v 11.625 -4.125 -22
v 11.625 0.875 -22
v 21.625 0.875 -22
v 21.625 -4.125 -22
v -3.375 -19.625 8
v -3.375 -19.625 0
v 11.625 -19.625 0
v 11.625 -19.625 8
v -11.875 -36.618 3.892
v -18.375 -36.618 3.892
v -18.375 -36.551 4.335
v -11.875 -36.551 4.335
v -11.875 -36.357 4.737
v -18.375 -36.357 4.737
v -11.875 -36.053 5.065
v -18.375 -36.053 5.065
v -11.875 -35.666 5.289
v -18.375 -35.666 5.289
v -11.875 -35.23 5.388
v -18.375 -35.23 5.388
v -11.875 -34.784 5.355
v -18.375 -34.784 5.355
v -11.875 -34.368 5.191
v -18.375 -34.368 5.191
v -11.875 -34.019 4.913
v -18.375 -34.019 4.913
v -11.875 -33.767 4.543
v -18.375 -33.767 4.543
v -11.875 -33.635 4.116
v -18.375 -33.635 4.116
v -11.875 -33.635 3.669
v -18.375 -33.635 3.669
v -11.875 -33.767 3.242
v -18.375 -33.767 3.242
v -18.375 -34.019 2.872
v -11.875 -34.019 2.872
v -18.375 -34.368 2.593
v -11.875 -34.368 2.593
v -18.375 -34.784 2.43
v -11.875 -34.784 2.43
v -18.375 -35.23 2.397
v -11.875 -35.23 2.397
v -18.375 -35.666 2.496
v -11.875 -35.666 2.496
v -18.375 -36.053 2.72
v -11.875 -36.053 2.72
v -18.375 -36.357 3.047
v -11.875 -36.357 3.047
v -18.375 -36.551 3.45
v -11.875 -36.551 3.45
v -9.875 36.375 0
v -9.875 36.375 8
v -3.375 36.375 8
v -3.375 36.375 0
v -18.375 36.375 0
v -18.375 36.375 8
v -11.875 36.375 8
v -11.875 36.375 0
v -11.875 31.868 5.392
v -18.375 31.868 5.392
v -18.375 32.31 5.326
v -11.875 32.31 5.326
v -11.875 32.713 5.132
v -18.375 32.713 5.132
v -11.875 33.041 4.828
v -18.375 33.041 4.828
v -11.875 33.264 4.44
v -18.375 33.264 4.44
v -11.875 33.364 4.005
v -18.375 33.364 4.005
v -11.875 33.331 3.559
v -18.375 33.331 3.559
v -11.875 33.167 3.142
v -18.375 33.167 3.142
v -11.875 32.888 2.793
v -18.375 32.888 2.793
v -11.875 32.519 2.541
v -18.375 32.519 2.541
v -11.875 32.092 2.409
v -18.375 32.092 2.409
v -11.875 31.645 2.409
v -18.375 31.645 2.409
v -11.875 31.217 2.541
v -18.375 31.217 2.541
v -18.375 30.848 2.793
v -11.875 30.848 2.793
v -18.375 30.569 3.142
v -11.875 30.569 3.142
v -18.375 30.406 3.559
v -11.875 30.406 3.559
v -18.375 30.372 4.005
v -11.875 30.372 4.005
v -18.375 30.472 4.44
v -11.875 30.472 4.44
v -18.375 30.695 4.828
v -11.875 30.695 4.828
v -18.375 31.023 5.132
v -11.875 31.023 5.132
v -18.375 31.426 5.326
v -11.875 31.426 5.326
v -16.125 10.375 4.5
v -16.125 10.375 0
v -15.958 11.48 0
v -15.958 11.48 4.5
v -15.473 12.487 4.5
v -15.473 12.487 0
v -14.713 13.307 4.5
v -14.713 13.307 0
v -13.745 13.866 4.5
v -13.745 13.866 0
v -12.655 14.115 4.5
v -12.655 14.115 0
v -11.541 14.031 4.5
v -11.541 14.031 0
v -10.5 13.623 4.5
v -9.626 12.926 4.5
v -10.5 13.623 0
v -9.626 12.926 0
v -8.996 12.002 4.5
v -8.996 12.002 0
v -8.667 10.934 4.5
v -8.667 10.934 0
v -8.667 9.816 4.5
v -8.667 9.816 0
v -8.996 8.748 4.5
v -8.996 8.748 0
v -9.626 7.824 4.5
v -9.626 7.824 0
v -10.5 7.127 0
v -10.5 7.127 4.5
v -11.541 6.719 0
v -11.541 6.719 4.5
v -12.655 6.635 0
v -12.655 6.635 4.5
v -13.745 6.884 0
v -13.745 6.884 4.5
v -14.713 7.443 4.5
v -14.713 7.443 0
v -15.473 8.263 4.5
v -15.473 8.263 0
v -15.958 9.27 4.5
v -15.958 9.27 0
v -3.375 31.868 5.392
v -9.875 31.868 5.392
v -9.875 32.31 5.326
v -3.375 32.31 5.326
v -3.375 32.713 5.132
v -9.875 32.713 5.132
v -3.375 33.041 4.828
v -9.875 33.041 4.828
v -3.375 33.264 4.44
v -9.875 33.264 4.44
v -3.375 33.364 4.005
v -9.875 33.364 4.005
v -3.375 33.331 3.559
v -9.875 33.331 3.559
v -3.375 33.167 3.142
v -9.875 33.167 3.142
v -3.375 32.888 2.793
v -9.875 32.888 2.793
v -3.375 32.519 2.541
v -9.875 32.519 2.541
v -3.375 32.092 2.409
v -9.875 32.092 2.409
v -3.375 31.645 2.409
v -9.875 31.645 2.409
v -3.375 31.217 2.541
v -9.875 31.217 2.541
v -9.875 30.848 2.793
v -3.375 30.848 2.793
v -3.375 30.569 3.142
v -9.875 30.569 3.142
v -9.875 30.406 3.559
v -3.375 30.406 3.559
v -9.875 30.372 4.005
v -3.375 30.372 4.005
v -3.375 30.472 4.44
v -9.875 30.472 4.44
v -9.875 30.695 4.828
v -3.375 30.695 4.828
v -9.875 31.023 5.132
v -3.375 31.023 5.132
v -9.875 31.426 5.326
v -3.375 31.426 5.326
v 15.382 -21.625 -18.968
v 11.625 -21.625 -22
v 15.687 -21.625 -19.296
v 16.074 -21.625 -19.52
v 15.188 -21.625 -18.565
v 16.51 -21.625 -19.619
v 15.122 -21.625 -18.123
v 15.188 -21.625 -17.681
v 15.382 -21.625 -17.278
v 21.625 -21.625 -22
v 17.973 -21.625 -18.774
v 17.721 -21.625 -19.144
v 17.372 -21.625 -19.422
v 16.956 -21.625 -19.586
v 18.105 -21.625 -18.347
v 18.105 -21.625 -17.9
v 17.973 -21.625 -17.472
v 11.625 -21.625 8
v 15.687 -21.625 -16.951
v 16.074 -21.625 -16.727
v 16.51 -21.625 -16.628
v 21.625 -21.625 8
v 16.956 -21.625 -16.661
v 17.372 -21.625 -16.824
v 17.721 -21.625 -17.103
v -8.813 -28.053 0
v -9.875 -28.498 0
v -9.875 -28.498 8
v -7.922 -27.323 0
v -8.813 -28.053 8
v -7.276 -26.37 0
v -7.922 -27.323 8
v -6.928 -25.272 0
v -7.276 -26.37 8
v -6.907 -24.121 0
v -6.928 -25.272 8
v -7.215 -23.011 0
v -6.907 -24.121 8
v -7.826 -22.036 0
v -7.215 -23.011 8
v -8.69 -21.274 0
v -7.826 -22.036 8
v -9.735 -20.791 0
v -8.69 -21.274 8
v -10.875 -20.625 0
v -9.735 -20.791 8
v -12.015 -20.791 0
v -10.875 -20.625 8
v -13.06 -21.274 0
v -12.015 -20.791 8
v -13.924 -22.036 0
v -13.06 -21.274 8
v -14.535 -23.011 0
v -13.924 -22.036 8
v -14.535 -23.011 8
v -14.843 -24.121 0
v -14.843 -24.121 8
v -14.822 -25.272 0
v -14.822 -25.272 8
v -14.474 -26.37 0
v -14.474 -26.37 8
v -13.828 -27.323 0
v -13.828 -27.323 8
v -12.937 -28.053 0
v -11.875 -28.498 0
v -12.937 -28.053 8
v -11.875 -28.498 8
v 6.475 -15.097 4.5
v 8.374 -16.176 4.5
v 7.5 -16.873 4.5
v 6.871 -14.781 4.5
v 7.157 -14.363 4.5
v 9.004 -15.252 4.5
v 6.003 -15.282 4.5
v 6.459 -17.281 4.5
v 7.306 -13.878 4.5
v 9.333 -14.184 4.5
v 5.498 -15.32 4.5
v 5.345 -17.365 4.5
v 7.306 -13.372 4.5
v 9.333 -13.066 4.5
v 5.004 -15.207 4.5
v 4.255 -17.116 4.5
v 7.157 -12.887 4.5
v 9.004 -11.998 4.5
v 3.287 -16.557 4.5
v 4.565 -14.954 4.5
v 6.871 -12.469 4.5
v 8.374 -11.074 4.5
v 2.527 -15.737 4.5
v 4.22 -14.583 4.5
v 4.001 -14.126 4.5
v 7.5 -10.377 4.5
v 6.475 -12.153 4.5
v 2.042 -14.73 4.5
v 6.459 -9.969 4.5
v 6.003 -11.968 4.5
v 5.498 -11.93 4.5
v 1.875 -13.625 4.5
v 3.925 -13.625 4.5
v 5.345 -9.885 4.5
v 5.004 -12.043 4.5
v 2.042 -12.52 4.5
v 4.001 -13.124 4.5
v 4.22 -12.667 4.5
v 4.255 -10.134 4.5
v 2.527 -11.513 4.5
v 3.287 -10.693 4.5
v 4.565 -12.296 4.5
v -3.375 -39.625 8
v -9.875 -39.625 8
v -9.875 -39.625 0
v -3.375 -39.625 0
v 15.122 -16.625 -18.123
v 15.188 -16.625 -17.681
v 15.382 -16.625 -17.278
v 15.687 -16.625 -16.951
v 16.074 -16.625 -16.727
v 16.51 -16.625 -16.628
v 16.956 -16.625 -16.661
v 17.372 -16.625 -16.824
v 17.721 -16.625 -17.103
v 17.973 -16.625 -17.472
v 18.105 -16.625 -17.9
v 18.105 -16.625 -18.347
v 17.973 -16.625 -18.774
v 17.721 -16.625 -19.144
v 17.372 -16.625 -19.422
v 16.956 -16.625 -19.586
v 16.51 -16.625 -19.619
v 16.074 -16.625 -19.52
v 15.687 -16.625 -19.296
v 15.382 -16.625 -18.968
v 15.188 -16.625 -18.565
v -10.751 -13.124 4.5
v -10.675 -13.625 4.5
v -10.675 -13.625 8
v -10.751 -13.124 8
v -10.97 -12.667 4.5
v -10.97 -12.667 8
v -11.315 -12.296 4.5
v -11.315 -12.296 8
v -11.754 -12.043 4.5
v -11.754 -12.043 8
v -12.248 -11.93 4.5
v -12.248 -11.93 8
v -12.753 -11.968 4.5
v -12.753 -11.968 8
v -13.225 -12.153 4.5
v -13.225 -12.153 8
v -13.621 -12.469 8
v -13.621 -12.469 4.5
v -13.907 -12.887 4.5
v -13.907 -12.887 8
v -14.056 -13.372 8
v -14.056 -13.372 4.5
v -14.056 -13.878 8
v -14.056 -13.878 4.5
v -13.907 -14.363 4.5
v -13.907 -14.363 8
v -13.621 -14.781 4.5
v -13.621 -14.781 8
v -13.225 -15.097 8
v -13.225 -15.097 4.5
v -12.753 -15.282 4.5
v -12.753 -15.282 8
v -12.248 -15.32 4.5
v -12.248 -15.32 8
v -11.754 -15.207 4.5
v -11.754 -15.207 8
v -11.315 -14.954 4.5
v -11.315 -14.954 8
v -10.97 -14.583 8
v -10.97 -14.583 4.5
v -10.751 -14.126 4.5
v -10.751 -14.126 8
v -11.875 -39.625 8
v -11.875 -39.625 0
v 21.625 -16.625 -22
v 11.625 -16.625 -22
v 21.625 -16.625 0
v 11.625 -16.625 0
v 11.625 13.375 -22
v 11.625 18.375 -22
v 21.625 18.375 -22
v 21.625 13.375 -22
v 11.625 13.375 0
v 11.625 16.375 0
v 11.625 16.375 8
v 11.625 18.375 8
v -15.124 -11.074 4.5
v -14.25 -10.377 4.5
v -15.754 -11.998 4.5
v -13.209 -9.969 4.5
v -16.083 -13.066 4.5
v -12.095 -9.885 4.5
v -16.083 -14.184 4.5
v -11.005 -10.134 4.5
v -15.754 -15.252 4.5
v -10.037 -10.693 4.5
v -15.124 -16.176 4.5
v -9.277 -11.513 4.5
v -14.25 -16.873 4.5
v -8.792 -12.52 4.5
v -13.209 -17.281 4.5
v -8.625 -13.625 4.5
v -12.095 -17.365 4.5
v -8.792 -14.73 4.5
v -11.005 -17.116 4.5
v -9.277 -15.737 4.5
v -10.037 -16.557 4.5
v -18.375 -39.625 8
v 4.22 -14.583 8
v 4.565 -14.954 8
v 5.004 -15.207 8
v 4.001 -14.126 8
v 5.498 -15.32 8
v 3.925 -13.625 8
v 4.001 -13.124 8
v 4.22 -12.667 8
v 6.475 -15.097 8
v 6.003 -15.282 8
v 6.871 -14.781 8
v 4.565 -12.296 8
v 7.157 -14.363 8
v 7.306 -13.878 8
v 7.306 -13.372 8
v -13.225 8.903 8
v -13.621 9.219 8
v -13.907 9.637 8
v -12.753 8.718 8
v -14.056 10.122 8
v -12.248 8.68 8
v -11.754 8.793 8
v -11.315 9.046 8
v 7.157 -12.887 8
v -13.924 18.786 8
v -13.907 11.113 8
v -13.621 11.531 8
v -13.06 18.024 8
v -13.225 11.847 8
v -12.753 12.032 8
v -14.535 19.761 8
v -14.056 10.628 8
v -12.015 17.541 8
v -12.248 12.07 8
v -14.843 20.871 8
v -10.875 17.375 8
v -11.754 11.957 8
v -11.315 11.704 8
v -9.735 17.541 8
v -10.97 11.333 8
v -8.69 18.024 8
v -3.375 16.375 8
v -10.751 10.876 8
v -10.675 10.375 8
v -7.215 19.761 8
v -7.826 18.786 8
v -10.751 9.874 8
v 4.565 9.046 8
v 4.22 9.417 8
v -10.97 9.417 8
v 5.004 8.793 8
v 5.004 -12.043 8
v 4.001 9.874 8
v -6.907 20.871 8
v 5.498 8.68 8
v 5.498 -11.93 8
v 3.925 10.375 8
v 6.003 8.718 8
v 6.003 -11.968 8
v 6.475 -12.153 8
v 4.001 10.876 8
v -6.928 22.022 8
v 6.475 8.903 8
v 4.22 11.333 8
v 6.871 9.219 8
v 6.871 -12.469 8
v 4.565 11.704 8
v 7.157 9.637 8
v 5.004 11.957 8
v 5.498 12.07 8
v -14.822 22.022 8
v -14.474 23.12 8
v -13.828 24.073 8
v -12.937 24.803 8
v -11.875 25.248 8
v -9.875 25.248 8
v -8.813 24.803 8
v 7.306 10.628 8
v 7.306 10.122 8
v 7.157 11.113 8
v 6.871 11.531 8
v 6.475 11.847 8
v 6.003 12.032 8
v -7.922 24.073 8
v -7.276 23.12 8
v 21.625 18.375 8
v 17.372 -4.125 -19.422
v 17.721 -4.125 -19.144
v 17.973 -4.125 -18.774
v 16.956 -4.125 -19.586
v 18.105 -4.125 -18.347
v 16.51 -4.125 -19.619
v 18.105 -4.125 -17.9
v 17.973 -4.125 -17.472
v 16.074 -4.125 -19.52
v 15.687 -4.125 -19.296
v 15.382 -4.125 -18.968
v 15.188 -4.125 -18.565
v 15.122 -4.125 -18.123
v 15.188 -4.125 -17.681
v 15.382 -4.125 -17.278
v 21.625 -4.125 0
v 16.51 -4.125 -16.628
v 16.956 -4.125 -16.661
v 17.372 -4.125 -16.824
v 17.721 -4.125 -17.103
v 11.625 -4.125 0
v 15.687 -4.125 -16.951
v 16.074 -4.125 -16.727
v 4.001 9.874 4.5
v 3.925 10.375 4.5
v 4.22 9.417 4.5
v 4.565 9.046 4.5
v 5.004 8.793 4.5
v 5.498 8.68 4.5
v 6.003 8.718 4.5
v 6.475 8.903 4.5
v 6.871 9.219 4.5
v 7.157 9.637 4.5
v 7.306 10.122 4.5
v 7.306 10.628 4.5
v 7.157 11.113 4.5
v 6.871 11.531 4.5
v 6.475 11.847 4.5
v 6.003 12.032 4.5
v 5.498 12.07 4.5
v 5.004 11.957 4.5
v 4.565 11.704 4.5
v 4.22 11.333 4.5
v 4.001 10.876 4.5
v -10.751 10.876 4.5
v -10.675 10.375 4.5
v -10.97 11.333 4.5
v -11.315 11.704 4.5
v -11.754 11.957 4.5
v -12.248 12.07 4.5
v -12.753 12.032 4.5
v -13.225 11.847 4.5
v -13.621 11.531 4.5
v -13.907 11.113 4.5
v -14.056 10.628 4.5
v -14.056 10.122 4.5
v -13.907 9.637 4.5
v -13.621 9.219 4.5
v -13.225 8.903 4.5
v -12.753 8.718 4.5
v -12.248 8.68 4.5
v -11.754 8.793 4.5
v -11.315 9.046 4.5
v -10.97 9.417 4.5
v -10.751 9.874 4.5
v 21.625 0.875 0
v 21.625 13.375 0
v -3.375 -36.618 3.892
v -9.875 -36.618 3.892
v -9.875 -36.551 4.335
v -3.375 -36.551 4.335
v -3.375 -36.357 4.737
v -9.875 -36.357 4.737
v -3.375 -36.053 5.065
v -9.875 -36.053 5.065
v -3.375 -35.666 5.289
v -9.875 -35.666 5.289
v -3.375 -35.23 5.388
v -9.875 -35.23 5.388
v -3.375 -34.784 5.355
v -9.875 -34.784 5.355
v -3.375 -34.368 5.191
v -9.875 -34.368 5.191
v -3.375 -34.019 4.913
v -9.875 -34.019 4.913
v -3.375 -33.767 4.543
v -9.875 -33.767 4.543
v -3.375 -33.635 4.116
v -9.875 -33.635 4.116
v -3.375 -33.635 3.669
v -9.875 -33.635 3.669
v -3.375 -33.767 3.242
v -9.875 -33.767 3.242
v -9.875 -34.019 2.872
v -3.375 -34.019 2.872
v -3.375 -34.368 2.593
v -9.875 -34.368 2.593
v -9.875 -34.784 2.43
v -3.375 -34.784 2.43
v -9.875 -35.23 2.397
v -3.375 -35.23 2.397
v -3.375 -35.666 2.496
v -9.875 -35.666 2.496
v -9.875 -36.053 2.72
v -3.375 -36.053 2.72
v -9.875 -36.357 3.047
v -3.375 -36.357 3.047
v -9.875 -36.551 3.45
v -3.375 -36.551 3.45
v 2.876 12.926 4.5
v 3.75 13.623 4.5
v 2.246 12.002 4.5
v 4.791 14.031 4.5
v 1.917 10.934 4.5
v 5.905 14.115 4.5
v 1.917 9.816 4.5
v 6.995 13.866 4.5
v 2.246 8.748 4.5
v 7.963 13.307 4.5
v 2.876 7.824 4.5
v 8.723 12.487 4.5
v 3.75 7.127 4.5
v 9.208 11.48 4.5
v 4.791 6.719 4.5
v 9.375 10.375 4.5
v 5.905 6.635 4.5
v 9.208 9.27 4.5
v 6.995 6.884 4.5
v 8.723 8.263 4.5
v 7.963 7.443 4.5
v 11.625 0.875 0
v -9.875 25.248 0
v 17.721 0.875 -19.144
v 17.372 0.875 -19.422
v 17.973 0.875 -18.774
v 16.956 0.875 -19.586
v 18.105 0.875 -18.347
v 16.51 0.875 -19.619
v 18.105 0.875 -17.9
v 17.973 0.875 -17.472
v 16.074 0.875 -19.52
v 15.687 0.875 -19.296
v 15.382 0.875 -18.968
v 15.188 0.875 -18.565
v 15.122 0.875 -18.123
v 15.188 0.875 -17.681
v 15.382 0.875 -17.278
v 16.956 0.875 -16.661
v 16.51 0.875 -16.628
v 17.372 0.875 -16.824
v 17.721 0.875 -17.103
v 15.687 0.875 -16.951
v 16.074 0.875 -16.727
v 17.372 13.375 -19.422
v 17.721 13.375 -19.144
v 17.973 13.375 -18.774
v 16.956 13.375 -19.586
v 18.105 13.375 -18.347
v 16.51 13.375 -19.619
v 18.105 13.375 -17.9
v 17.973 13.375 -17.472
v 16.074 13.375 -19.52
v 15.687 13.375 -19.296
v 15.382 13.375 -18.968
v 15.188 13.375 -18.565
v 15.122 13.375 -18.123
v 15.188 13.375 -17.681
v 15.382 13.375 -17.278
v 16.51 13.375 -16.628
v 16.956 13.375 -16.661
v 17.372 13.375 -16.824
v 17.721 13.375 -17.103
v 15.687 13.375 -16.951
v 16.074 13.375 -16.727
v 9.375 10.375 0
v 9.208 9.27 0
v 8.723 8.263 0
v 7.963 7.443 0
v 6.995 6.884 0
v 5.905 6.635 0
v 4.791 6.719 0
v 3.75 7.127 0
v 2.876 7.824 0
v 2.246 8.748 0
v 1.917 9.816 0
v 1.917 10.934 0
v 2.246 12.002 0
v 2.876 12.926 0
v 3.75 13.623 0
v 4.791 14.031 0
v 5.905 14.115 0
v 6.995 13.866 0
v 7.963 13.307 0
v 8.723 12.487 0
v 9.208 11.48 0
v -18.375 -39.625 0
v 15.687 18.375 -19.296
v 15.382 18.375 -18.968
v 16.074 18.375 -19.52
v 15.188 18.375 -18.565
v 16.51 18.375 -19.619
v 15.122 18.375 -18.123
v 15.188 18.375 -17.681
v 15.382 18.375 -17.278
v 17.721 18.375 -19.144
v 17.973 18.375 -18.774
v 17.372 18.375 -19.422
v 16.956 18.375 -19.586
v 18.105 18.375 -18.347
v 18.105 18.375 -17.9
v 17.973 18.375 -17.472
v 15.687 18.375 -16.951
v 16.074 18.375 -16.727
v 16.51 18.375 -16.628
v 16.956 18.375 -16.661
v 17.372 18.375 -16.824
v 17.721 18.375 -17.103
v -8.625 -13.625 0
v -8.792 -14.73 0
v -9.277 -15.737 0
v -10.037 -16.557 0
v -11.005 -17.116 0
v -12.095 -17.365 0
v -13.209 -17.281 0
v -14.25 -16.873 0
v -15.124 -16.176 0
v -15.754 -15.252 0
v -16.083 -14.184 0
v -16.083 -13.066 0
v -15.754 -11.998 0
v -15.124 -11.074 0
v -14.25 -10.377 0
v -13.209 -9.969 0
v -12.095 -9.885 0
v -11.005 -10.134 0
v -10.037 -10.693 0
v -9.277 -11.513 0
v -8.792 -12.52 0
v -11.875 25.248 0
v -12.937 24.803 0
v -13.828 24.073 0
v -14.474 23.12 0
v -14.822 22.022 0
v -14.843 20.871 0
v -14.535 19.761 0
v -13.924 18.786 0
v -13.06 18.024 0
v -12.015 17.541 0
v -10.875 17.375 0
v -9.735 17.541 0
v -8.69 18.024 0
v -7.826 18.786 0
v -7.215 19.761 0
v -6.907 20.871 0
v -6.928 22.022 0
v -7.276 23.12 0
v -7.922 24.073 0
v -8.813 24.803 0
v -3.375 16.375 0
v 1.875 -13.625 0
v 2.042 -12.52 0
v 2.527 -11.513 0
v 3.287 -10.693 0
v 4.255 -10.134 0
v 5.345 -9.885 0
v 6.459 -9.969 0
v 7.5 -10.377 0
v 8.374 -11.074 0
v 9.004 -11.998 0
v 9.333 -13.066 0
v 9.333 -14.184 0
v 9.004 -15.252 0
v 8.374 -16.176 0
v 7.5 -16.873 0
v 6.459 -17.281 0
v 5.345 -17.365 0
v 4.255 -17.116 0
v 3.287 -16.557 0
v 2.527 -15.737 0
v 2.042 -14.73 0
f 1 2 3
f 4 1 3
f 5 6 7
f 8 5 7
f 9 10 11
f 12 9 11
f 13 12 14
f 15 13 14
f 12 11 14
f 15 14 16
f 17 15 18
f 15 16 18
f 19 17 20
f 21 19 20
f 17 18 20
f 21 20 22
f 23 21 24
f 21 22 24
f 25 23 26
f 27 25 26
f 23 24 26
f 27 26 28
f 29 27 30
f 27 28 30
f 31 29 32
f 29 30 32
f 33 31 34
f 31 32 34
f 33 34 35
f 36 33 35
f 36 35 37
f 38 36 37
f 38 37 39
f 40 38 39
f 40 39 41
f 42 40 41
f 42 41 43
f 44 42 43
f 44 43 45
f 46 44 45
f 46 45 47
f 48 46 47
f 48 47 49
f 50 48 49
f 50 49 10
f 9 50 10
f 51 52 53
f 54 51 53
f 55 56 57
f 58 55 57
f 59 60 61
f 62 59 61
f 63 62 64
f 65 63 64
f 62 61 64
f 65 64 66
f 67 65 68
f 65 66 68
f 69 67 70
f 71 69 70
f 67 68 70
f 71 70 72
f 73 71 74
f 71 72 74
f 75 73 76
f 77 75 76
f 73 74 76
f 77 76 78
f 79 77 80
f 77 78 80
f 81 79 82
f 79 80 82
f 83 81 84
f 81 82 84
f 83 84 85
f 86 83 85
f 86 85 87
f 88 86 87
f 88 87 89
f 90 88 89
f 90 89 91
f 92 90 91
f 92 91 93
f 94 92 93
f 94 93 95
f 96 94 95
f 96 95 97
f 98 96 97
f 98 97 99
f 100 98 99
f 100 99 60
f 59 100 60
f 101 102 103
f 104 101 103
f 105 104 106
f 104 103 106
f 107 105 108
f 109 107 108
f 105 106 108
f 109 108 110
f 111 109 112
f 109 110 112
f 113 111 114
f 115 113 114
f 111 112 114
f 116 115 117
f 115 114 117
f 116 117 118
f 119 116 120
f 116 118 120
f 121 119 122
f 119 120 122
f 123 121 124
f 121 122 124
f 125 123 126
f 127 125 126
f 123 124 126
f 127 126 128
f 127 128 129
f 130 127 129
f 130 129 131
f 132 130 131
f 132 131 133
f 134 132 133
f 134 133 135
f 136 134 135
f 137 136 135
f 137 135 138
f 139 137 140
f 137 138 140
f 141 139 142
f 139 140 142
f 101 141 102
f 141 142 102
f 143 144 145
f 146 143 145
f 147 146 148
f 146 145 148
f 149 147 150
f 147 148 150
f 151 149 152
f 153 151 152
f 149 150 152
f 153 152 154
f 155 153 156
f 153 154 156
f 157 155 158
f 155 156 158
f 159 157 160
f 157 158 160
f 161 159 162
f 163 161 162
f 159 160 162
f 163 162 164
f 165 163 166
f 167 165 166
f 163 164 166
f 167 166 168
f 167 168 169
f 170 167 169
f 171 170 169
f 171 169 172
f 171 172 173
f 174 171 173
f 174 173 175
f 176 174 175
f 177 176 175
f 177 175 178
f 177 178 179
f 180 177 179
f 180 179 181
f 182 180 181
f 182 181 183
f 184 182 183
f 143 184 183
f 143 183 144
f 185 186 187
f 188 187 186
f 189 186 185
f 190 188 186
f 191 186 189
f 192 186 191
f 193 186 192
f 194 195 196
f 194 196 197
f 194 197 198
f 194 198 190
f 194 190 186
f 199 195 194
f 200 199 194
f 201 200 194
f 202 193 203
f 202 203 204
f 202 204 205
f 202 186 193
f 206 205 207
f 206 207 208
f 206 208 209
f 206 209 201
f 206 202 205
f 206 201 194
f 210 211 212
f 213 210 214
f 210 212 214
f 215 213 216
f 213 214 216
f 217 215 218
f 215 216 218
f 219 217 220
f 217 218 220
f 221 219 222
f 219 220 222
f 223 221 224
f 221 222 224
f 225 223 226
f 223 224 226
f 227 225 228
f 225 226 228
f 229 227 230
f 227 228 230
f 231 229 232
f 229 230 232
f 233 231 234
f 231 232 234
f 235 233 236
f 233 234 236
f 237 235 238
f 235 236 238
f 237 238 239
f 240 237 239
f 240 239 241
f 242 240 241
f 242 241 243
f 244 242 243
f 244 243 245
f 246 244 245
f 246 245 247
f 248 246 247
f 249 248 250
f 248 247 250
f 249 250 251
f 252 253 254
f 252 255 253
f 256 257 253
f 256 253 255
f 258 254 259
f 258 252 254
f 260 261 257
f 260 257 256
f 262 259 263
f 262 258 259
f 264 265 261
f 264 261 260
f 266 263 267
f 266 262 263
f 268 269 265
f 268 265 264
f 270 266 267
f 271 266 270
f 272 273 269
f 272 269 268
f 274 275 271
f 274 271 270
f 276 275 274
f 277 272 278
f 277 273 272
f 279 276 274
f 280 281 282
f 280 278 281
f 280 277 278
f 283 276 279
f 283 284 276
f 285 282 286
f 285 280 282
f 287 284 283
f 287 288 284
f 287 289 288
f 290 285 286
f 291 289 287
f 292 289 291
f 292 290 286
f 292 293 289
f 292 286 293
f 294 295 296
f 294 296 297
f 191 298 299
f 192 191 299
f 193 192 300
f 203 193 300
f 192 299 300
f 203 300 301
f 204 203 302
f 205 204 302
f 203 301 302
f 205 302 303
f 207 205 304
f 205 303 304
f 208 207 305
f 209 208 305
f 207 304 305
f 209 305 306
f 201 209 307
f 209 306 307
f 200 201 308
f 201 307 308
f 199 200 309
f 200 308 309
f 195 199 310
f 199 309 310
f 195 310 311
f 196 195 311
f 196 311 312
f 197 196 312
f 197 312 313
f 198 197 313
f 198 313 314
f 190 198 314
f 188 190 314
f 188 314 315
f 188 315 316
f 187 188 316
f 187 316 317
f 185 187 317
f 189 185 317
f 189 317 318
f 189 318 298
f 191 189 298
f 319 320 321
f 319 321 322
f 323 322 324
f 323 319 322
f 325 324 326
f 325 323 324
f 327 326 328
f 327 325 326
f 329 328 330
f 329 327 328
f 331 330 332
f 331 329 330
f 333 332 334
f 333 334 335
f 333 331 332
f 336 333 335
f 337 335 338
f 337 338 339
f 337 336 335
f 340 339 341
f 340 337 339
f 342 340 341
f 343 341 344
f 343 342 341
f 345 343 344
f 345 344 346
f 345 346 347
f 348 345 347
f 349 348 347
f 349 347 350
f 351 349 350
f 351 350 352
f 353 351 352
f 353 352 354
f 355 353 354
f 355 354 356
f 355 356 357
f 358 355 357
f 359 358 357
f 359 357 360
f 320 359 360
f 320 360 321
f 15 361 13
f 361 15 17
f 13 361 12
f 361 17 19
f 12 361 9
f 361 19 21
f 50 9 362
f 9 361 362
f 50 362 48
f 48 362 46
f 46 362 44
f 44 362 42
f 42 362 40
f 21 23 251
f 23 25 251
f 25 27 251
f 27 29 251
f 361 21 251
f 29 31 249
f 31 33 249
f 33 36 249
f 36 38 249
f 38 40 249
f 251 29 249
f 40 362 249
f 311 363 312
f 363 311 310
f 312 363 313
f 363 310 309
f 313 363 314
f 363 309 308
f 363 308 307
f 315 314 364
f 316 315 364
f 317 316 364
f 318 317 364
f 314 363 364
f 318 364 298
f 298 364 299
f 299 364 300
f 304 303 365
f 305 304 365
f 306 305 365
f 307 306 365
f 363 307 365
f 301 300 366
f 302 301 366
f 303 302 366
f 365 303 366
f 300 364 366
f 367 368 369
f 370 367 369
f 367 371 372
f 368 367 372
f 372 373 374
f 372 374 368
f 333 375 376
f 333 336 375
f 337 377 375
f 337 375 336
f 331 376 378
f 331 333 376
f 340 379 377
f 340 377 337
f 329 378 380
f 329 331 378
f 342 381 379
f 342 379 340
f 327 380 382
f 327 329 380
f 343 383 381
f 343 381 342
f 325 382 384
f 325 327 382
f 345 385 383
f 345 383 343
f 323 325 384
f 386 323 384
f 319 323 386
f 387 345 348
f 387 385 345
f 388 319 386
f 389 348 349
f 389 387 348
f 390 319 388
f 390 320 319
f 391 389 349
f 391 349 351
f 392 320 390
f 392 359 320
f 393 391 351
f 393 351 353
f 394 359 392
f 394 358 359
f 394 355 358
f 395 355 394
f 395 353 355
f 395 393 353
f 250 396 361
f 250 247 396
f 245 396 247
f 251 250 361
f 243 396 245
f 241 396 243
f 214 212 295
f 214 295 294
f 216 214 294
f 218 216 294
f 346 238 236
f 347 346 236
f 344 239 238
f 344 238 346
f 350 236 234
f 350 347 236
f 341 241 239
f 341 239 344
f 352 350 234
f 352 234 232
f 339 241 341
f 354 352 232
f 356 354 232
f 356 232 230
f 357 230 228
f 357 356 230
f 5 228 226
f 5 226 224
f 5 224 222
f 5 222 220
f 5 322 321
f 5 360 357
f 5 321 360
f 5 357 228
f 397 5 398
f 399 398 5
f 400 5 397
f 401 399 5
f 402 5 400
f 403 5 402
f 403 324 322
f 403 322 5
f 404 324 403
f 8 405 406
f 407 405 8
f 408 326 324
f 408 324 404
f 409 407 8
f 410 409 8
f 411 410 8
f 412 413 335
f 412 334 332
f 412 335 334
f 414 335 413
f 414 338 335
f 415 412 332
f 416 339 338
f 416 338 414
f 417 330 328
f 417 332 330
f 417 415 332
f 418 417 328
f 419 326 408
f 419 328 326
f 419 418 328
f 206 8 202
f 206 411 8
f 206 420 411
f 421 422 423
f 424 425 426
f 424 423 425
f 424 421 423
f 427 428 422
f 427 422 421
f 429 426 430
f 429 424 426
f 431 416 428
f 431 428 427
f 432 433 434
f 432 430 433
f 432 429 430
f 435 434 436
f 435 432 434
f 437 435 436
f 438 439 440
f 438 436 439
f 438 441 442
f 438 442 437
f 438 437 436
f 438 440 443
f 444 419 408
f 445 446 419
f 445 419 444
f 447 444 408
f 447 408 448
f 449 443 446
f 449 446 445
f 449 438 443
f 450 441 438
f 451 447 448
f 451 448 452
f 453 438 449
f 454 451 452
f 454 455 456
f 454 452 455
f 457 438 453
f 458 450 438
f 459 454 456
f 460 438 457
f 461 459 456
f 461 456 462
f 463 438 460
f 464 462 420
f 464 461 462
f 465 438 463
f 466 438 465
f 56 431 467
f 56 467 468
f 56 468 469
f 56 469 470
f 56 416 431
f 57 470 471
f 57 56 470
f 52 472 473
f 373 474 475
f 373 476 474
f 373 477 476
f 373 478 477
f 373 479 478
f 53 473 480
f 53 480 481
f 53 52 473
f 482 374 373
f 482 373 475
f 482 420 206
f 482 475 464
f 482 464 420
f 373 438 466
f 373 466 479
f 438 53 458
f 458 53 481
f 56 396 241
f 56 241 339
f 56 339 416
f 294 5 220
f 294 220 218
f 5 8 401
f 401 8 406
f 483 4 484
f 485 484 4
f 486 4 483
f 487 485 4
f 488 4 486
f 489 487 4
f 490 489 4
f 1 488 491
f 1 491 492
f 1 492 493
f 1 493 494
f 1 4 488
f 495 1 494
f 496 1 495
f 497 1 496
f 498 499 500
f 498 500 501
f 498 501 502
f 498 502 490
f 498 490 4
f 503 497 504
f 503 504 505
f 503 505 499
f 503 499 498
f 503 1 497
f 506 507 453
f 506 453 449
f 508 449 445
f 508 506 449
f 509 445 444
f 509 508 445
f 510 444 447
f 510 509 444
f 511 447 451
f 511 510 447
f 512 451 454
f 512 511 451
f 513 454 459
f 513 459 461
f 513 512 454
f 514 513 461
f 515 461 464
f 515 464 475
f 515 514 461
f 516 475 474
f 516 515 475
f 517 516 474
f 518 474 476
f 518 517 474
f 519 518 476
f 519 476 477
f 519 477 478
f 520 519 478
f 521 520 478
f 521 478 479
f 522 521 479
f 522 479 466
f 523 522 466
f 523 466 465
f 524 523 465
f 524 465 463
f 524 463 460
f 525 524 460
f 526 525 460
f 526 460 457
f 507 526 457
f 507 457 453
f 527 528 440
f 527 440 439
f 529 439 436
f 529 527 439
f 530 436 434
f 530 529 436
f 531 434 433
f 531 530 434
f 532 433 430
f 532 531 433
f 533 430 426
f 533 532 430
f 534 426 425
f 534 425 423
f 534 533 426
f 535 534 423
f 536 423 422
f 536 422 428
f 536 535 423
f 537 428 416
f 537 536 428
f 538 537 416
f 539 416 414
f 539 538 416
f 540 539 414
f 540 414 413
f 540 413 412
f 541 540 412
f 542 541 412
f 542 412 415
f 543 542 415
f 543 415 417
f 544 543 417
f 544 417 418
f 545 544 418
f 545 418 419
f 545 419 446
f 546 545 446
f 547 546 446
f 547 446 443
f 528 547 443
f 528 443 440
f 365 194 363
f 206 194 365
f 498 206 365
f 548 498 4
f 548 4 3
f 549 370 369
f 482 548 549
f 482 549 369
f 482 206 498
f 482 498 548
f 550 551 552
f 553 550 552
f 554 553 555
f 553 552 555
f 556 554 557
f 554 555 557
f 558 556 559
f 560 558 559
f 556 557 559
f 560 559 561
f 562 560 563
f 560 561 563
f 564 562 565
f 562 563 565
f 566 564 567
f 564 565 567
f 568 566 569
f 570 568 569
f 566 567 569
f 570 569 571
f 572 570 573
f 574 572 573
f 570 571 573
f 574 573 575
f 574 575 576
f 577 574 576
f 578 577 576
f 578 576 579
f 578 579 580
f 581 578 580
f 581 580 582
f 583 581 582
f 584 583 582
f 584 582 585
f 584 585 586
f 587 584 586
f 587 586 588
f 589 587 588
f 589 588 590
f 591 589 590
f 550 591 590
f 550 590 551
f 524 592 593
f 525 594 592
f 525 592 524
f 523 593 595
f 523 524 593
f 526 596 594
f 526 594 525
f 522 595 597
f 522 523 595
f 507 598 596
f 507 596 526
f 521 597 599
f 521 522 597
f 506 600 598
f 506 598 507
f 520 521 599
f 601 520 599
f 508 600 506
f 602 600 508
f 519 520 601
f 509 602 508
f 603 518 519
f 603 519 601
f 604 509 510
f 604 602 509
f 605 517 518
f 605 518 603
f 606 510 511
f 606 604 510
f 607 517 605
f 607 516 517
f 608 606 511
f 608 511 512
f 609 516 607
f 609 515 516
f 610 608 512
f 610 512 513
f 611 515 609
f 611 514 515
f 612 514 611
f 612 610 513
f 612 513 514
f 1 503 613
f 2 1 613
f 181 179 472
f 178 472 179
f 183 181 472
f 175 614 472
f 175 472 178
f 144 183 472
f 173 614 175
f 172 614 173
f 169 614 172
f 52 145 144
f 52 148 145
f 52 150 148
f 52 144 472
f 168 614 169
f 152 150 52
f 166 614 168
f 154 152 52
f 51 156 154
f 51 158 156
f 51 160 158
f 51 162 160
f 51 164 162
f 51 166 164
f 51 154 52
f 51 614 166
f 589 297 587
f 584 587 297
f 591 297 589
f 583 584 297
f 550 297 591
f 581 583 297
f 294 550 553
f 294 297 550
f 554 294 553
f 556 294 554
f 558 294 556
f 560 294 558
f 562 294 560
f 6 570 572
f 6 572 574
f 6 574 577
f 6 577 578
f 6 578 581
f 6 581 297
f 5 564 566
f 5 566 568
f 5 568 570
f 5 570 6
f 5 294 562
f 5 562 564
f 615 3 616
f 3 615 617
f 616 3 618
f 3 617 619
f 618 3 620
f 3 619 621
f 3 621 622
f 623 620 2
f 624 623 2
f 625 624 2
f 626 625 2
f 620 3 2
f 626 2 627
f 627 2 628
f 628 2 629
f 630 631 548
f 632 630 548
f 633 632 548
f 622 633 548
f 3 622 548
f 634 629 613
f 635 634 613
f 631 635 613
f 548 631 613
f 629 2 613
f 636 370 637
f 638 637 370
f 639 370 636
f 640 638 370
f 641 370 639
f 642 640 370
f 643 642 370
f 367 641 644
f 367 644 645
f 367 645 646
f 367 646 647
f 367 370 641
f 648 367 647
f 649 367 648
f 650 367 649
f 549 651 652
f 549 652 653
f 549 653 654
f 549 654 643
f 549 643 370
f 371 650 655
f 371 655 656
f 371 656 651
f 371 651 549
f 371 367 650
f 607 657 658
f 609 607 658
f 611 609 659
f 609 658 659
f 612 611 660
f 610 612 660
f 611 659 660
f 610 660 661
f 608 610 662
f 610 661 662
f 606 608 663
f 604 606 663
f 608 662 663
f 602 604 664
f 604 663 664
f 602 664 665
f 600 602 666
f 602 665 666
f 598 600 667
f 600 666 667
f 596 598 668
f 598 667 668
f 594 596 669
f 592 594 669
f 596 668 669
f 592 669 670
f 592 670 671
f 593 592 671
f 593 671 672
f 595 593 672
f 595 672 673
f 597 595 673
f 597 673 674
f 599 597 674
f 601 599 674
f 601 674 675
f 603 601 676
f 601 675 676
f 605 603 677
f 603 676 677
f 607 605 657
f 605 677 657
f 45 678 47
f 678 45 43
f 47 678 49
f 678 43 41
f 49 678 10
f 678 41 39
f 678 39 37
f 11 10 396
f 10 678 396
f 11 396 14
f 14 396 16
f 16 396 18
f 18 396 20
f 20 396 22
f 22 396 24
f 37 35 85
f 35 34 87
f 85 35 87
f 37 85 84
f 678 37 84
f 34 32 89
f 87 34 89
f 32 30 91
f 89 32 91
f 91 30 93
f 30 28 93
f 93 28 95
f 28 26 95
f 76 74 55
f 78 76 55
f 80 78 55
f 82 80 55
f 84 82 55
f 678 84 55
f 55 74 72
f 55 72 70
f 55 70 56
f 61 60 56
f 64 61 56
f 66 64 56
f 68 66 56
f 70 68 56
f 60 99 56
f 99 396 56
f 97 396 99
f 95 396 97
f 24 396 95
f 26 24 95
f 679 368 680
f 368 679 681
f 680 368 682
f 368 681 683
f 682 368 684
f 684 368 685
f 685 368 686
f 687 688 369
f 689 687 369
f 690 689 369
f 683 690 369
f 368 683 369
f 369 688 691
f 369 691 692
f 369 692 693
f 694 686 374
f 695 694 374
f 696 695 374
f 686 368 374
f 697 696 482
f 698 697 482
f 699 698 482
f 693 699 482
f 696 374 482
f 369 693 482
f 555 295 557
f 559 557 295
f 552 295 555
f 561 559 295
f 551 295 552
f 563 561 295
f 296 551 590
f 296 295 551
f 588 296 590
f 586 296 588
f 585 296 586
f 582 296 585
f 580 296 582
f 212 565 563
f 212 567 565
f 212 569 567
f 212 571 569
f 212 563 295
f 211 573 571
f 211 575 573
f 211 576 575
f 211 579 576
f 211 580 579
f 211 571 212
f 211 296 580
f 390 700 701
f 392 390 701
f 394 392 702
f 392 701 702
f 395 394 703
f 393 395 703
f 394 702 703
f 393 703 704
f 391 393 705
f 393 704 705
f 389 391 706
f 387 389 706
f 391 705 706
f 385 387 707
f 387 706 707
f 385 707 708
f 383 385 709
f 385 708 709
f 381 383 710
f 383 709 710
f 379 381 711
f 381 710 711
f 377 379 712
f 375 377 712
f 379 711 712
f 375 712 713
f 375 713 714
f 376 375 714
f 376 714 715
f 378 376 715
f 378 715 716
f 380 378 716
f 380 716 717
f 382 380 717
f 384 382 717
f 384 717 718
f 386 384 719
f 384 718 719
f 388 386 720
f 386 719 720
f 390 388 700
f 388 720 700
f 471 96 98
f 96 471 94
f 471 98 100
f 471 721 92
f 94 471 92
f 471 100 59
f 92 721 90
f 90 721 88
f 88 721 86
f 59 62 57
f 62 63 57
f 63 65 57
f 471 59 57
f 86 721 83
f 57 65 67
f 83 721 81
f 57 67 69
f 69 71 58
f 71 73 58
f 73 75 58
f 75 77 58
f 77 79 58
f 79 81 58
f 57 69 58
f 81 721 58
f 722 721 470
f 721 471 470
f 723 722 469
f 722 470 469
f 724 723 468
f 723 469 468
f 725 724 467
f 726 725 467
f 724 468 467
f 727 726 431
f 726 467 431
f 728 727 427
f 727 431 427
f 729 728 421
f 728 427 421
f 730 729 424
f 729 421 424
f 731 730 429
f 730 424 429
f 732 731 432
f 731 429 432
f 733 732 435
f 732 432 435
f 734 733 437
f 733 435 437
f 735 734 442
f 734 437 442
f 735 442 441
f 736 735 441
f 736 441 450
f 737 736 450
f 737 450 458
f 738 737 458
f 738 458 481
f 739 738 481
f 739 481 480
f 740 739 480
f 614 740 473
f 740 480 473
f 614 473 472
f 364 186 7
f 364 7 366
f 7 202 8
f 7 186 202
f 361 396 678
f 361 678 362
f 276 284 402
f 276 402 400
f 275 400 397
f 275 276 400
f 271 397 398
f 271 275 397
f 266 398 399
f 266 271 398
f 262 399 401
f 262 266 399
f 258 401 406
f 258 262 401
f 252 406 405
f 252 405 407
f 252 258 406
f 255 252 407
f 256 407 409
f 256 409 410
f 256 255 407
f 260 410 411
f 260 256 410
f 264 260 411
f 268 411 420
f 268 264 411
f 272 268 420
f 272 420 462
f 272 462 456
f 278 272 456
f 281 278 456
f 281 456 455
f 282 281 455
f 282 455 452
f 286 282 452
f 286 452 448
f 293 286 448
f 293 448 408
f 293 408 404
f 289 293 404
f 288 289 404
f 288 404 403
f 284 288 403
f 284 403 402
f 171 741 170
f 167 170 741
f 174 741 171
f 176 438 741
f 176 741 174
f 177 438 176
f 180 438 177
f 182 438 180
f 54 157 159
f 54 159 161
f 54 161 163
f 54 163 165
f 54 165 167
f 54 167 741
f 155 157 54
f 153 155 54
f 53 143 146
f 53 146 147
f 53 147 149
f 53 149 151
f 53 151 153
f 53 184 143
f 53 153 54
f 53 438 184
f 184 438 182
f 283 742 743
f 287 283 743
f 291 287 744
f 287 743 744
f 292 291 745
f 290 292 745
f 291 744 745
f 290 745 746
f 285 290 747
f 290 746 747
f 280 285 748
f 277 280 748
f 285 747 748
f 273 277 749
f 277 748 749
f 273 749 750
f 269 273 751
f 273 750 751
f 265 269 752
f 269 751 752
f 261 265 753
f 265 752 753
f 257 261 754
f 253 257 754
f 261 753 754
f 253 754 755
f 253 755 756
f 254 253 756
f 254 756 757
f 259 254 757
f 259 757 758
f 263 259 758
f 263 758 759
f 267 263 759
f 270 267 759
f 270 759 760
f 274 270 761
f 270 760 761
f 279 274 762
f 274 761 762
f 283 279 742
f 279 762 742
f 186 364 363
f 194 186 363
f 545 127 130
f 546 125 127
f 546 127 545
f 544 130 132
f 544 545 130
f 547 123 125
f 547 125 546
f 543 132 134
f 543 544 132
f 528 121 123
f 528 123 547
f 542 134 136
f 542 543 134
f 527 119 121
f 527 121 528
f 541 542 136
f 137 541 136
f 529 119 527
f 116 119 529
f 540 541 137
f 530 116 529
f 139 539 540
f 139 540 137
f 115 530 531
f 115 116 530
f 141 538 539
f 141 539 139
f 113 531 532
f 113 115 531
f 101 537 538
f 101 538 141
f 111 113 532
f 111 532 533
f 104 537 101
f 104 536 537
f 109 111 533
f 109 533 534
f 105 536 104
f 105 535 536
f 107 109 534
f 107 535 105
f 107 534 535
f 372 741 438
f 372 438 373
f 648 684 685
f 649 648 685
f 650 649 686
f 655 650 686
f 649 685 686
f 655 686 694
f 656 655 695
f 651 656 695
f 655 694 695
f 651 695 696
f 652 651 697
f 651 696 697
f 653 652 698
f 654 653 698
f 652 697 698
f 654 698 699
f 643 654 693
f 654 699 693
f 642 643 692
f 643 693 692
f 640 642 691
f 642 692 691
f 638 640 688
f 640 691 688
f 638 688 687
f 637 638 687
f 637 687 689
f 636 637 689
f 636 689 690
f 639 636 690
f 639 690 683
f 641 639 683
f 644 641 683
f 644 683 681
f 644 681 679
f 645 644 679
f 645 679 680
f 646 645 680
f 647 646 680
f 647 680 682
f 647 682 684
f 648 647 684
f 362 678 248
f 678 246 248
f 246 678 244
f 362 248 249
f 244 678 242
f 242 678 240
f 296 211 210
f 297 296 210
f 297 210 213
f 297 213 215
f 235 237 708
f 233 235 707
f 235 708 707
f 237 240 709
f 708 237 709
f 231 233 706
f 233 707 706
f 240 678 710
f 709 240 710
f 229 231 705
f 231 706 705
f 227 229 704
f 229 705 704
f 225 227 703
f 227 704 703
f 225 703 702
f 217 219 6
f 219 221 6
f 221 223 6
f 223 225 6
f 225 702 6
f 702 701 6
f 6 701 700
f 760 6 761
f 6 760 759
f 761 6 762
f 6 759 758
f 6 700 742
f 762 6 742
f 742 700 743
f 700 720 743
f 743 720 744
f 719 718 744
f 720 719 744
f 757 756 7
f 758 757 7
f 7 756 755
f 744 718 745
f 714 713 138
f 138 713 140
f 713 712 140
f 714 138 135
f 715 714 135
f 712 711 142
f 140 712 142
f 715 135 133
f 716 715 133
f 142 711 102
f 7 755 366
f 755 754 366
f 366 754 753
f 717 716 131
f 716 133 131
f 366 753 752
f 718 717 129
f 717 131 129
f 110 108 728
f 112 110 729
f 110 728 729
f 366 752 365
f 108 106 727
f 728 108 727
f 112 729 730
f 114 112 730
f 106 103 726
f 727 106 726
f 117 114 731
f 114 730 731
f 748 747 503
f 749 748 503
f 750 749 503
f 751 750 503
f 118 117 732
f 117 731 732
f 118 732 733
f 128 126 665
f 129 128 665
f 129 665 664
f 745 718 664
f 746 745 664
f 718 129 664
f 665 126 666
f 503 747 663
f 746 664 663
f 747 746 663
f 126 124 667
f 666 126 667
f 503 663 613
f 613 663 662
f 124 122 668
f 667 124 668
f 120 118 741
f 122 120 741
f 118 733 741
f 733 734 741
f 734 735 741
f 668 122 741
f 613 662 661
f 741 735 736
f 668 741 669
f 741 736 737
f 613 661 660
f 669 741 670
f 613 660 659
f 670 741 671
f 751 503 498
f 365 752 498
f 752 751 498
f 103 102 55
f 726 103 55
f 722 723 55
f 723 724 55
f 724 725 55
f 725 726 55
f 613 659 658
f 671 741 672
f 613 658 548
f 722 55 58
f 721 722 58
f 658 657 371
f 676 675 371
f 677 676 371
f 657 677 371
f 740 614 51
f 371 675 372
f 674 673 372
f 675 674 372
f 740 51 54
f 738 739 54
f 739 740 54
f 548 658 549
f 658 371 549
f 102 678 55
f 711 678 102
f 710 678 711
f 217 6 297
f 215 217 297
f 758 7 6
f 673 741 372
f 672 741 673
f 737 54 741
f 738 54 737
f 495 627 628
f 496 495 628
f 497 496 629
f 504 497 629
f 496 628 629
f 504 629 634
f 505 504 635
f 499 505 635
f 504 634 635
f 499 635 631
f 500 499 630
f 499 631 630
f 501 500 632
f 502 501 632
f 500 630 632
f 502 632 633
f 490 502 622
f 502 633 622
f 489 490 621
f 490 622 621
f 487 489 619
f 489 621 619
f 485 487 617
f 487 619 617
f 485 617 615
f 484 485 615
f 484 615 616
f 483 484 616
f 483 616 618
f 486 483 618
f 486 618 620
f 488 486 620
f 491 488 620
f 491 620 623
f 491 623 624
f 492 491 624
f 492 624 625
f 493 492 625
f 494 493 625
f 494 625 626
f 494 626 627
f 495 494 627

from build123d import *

# Parameters (mm, degrees)
SKETCH_1_W          = 30
SKETCH_1_H          = 36
SKETCH_1_R          = 1.7
EXTRUDE_1_DEPTH     = 8
SKETCH_2_R          = 3.75
CUT_EXTRUDE_1_DEPTH = 4.5
SKETCH_3_W          = 15
SKETCH_3_H          = 20
SKETCH_3_R          = 4
EXTRUDE_4_DEPTH     = 8
SKETCH_8_W          = 10
SKETCH_8_H          = 40
EXTRUDE_5_DEPTH     = 30
SKETCH_10_W         = 12
SKETCH_10_H         = 12.5
SKETCH_10_W_2       = 5
CUT_EXTRUDE_4_DEPTH = 30
SKETCH_11_R         = 1.5
CUT_EXTRUDE_5_DEPTH = 47
SKETCH_12_W         = 2
SKETCH_12_H         = 25.842259392
SKETCH_12_H_2       = 30.756424204
CUT_EXTRUDE_6_DEPTH = 10
SKETCH_13_R         = 1.5
CUT_EXTRUDE_7_DEPTH = 40
SKETCH_14_W         = 5
SKETCH_14_H         = 12.5
CUT_EXTRUDE_8_DEPTH = 10


with BuildPart() as part:
    # 草图1 → 凸台-拉伸1 (new body)
    with BuildSketch(Plane.XY):
        with Locations((-3.375, -1.625)):
            Rectangle(SKETCH_1_W, SKETCH_1_H)
        with Locations((-12.375, 10.375)):
            Circle(SKETCH_1_R, mode=Mode.SUBTRACT)
        with Locations((-12.375, -13.625)):
            Circle(SKETCH_1_R, mode=Mode.SUBTRACT)
        with Locations(Location((5.625, -13.625, 0), (0, 0, 180))):
            Circle(SKETCH_1_R, mode=Mode.SUBTRACT)
        with Locations(Location((5.625, 10.375, 0), (0, 0, 180))):
            Circle(SKETCH_1_R, mode=Mode.SUBTRACT)
    extrude(amount=EXTRUDE_1_DEPTH)

    # 草图2 → 切除-拉伸1 (cut)
    with BuildSketch(Plane(origin=(0, 0, 0), x_dir=(-1, 0, 0), z_dir=(0, 0, -1))):
        with Locations((12.375, 10.375)):
            Circle(SKETCH_2_R)
        with Locations(Location((-5.625, 10.375, 0), (0, 0, 180))):
            Circle(SKETCH_2_R)
        with Locations(Location((12.375, -13.625, 0), (0, 0, 180))):
            Circle(SKETCH_2_R)
        with Locations((-5.625, -13.625)):
            Circle(SKETCH_2_R)
    extrude(amount=-CUT_EXTRUDE_1_DEPTH, mode=Mode.SUBTRACT)

    # 草图3 → 凸台-拉伸4 (add)
    # profile 1 of 2: a face of its own
    with BuildSketch(Plane.XY.offset(8)):
        with Locations((-10.875, 26.375)):
            Rectangle(SKETCH_3_W, SKETCH_3_H)
        with Locations((-10.875, 21.375)):
            Circle(SKETCH_3_R, mode=Mode.SUBTRACT)
    # profile 2 of 2: a face of its own
    with BuildSketch(Plane.XY.offset(8)):
        with Locations((-10.875, -29.625)):
            Rectangle(SKETCH_3_W, SKETCH_3_H)
        with Locations((-10.875, -24.625)):
            Circle(SKETCH_3_R, mode=Mode.SUBTRACT)
    extrude(amount=-EXTRUDE_4_DEPTH)

    # 草图8 → 凸台-拉伸5 (add)
    with BuildSketch(Plane.XY.offset(8)):
        with Locations((16.625, -1.625)):
            Rectangle(SKETCH_8_W, SKETCH_8_H)
    extrude(amount=-EXTRUDE_5_DEPTH)

    # 草图10 → 切除-拉伸4 (cut)
    with BuildSketch(Plane.ZY.offset(-11.625)):
        with Locations((-16, 7.125)):
            Rectangle(SKETCH_10_W, SKETCH_10_H)
        with Locations((-2.5, 7.125)):
            Rectangle(SKETCH_10_W_2, SKETCH_10_H)
        with Locations((-2.5, -10.375)):
            Rectangle(SKETCH_10_W_2, SKETCH_10_H)
        with Locations((-16, -10.375)):
            Rectangle(SKETCH_10_W, SKETCH_10_H)
    extrude(amount=-CUT_EXTRUDE_4_DEPTH, mode=Mode.SUBTRACT)

    # 草图11 → 切除-拉伸5 (cut)
    with BuildSketch(Plane(origin=(0, 18.375, 0), x_dir=(1, 0, 0), z_dir=(0, 1, 0))):
        with Locations(Location((16.621809271, 18.123313308, 0), (0, 0, 180))):
            Circle(SKETCH_11_R)
    extrude(amount=-CUT_EXTRUDE_5_DEPTH, mode=Mode.SUBTRACT)

    # 草图12 → 切除-拉伸6 (cut)
    with BuildSketch(Plane(origin=(0, 0, 0), x_dir=(-1, 0, 0), z_dir=(0, 0, -1))):
        with Locations((10.875, 36.375)):
            Rectangle(SKETCH_12_W, SKETCH_12_H)
        with Locations((10.875, -39.625)):
            Rectangle(SKETCH_12_W, SKETCH_12_H_2)
    extrude(amount=-CUT_EXTRUDE_6_DEPTH, mode=Mode.SUBTRACT)

    # 草图13 → 切除-拉伸7 (cut)
    with BuildSketch(Plane.ZY.offset(18.375)):
        with Locations((3.892451488, 31.868119268)):
            Circle(SKETCH_13_R)
        with Locations(Location((3.892451488, -35.118119268, 0), (0, 0, 270))):
            Circle(SKETCH_13_R)
    extrude(amount=-CUT_EXTRUDE_7_DEPTH, mode=Mode.SUBTRACT)

    # 草图14 → 切除-拉伸8 (cut)
    with BuildSketch(Plane(origin=(21.625, 0, 0), x_dir=(0, 0, -1), z_dir=(1, 0, 0))):
        with Locations((7.5, 7.125)):
            Rectangle(SKETCH_14_W, SKETCH_14_H)
        with Locations((7.5, -10.375)):
            Rectangle(SKETCH_14_W, SKETCH_14_H)
    extrude(amount=-CUT_EXTRUDE_8_DEPTH, mode=Mode.SUBTRACT)


solid = part.part
